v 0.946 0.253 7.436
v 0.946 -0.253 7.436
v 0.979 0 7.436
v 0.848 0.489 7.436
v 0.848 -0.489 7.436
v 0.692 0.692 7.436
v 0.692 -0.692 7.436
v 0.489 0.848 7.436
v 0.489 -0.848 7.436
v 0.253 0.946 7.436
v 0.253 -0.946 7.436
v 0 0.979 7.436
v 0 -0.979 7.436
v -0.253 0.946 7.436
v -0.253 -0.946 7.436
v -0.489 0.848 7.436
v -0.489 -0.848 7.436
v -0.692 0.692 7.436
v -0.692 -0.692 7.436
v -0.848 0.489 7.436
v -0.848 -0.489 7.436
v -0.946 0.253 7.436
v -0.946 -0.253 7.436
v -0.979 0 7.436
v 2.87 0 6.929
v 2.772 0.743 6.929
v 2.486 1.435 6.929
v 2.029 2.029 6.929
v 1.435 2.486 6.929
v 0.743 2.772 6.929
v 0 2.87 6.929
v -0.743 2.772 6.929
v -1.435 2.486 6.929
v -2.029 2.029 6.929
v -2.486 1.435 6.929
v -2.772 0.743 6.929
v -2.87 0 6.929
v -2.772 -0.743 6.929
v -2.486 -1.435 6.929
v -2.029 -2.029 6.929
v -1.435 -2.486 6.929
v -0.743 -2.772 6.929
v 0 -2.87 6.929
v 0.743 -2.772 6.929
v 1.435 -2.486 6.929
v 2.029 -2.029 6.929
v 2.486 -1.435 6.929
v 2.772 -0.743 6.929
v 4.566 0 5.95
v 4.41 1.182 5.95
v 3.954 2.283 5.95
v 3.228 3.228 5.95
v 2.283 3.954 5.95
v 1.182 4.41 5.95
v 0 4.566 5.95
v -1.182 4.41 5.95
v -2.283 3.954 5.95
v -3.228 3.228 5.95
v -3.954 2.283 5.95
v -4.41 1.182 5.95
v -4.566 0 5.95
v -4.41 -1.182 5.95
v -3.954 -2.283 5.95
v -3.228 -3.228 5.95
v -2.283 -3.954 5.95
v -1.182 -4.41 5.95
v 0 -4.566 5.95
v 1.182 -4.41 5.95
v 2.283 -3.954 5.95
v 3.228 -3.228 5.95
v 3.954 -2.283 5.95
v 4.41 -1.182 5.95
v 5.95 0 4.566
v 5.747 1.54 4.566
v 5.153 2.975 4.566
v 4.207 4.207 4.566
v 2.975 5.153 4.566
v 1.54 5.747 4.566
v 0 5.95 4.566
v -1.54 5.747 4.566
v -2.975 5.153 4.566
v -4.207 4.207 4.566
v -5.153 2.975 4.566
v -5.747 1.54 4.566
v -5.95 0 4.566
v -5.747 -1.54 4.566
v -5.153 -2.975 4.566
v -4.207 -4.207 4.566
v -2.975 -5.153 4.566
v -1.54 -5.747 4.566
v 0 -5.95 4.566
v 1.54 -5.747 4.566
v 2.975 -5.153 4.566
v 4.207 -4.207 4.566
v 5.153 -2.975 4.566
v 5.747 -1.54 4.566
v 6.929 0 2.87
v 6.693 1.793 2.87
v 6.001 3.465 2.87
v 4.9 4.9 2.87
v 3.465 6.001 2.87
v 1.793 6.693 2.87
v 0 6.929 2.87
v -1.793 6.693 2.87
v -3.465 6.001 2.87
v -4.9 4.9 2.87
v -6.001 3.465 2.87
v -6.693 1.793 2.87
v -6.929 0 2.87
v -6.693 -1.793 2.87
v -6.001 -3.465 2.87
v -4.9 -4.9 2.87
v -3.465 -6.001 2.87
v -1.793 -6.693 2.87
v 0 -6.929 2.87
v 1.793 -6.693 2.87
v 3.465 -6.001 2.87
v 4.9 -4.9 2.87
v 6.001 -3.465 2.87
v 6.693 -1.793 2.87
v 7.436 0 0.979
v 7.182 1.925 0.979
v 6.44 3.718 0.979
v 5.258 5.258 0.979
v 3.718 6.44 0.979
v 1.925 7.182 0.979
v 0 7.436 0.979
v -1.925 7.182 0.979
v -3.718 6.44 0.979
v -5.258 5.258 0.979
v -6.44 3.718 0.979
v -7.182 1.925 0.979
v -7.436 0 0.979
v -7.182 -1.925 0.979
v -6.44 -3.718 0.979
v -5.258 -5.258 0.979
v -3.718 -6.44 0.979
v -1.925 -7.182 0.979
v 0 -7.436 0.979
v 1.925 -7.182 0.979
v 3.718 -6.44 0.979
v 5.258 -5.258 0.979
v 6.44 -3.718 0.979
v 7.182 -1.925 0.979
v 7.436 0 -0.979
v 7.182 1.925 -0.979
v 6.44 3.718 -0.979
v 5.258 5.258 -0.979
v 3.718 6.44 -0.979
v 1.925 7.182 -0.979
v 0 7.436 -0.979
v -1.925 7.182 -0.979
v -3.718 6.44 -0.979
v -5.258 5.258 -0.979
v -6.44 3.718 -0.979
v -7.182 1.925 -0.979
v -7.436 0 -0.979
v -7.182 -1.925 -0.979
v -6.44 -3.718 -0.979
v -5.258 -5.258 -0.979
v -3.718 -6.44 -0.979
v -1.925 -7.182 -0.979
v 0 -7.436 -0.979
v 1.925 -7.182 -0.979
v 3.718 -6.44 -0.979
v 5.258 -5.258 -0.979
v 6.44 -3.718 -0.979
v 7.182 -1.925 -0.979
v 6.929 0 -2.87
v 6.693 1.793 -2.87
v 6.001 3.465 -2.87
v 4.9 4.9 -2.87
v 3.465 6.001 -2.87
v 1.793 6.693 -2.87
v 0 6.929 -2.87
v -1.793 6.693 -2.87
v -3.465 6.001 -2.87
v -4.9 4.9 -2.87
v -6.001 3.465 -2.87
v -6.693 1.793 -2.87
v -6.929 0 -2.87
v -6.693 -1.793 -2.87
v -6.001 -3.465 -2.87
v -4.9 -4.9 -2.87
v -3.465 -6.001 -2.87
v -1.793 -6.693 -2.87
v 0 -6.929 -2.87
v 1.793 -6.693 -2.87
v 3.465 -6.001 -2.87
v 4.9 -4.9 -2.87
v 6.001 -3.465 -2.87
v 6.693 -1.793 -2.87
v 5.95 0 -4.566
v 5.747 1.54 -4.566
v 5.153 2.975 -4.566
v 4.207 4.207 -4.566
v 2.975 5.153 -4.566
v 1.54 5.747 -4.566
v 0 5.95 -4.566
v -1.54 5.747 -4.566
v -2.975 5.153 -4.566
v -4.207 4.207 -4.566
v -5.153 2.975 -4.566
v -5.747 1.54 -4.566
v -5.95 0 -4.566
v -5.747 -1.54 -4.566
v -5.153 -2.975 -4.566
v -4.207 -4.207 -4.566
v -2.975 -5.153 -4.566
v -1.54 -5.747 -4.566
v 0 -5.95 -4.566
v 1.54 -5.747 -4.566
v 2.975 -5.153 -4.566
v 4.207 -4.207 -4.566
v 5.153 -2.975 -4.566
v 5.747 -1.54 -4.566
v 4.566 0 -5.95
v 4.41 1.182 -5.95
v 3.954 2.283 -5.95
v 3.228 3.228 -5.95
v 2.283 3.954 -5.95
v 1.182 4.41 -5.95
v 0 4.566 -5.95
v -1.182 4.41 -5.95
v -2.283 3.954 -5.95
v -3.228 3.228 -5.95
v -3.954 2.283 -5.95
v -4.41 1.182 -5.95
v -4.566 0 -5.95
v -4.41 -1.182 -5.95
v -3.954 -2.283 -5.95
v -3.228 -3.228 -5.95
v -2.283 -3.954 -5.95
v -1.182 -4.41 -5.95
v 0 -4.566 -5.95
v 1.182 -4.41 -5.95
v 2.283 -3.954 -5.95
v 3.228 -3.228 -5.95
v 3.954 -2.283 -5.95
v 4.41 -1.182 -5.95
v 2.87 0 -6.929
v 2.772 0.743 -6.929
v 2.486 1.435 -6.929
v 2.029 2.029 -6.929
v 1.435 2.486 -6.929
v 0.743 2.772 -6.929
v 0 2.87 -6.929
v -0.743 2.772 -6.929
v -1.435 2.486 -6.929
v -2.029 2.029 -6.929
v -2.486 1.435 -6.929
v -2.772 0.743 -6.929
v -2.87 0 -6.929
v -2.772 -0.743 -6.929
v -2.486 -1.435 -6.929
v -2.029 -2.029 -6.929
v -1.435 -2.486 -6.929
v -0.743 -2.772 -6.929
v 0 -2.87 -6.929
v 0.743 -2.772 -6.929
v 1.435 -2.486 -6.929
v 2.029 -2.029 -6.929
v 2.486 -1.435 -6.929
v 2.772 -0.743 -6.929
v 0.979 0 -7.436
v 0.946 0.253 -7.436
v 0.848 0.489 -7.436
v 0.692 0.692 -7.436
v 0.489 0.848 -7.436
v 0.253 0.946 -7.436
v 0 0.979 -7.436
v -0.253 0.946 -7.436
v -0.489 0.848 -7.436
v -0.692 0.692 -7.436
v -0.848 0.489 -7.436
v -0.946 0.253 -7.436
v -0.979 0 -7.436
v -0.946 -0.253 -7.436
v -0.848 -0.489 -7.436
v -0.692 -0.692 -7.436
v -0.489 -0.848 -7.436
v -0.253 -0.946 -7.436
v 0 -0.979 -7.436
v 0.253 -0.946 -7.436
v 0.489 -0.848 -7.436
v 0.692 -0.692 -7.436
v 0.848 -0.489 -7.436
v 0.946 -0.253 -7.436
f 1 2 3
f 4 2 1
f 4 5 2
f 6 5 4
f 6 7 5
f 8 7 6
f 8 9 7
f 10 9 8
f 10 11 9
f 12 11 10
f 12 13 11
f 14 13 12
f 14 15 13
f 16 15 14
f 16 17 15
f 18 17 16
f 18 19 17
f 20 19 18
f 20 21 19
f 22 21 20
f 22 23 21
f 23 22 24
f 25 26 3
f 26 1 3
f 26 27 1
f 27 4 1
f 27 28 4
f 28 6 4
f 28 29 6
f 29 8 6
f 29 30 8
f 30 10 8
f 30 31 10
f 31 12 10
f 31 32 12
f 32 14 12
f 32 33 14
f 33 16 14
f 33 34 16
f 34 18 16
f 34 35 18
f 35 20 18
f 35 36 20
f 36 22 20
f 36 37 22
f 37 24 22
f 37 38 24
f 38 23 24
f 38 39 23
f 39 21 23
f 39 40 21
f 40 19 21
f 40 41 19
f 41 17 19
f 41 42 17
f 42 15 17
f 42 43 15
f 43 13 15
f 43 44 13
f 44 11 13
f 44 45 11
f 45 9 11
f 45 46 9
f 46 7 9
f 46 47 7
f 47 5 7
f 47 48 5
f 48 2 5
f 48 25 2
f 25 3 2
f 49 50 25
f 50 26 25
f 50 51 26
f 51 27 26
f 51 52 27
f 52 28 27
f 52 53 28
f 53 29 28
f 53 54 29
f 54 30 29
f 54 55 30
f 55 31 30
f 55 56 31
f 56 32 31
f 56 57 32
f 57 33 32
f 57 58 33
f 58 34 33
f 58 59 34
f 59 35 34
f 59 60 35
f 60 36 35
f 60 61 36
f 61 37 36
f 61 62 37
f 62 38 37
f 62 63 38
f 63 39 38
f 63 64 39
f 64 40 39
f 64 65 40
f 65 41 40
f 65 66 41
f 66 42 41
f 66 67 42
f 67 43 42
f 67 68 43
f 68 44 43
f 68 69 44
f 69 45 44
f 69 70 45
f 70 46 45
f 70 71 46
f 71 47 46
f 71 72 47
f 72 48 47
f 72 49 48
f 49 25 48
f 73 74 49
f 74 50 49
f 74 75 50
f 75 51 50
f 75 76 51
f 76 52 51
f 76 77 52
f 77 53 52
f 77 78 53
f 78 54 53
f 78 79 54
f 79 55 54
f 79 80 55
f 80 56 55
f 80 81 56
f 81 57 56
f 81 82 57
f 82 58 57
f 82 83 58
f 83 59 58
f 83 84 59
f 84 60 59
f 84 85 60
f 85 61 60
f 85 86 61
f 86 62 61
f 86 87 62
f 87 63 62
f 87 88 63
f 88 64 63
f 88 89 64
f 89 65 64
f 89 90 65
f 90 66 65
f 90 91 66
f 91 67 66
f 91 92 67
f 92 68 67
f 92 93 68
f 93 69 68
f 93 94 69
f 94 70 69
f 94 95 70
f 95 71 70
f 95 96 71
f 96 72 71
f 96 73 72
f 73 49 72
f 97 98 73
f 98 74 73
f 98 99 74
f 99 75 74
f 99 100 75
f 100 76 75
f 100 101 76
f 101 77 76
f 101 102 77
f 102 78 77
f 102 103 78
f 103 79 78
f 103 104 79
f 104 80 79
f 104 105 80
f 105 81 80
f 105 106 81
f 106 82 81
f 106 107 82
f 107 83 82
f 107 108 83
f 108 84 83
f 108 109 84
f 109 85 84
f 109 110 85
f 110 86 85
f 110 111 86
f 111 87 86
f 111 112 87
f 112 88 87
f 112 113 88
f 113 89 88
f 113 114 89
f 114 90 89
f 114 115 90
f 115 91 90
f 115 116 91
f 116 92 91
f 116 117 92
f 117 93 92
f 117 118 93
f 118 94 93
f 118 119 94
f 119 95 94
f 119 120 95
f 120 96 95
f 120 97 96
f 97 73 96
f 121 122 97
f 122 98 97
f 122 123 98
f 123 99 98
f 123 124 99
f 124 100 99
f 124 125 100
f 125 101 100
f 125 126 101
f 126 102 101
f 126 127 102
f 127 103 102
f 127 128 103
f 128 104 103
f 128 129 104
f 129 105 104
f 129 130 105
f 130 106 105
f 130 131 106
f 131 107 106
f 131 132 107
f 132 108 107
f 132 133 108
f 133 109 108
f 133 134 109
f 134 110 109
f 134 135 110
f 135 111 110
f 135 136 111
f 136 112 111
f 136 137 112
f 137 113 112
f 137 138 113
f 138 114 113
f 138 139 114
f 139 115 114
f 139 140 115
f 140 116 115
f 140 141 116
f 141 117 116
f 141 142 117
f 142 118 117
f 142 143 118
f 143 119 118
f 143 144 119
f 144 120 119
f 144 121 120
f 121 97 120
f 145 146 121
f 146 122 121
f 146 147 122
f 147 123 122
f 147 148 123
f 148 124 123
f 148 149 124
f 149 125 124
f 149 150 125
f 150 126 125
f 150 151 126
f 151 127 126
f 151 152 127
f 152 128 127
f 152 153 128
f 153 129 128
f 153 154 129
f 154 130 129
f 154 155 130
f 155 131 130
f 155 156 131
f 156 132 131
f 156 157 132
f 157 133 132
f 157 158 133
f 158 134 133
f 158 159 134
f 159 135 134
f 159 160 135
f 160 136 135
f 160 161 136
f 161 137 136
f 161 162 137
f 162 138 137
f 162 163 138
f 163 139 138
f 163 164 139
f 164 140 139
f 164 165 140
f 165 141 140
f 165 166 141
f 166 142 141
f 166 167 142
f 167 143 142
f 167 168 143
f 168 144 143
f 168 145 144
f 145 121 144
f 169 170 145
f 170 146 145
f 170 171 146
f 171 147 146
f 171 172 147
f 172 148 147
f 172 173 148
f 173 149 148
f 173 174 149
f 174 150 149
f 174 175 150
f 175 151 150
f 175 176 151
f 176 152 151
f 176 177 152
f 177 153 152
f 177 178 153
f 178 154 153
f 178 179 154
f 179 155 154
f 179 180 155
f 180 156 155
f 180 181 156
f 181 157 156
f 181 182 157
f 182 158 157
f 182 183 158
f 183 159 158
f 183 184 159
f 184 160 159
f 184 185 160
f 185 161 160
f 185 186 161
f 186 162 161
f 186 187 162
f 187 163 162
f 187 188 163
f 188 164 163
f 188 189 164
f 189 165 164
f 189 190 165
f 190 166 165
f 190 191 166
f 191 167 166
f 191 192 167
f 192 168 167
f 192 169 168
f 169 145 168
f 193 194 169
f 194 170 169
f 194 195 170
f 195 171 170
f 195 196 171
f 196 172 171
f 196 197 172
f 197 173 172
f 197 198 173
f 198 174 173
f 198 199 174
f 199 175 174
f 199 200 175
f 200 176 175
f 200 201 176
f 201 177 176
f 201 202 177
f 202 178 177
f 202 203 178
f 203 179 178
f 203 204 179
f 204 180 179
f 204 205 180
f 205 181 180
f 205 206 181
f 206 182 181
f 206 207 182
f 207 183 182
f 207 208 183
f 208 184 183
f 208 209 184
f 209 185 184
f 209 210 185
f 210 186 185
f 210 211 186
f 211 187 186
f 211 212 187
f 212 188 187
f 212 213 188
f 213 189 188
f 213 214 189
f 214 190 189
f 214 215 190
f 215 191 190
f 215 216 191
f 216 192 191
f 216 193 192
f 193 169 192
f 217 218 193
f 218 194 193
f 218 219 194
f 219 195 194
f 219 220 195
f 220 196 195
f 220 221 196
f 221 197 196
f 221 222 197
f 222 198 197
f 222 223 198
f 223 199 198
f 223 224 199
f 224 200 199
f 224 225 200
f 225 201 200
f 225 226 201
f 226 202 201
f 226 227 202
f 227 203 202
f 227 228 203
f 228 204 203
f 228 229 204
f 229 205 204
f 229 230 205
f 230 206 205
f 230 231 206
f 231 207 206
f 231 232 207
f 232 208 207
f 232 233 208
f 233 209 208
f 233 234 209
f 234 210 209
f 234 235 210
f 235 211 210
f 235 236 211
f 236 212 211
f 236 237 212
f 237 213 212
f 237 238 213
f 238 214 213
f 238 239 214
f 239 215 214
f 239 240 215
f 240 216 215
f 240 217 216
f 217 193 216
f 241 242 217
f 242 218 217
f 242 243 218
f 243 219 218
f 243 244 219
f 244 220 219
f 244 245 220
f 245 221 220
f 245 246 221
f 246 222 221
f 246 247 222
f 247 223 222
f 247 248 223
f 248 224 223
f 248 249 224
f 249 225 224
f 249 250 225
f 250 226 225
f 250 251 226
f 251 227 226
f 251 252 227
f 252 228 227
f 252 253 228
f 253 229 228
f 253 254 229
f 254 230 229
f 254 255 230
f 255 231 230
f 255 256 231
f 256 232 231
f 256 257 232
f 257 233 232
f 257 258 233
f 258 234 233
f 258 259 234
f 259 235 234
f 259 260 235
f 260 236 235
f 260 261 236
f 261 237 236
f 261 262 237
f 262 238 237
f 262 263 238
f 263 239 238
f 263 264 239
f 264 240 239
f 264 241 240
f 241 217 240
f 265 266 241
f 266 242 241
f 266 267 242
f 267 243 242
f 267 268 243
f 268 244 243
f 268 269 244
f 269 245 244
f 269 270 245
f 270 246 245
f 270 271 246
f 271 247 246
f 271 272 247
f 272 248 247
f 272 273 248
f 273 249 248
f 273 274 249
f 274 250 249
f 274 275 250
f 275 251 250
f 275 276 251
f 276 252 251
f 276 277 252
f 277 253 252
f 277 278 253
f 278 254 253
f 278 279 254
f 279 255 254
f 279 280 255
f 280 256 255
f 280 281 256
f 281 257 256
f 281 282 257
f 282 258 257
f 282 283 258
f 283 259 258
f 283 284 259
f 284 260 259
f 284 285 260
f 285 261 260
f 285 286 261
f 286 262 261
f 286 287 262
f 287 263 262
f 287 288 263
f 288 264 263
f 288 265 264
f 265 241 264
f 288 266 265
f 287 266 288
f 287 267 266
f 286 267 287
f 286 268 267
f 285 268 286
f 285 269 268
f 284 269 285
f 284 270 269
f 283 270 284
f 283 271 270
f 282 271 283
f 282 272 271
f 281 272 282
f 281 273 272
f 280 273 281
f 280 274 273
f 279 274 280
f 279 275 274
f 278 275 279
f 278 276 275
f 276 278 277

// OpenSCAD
// Generated by SolidPython 1.0.1 on 2020-07-29 00:02:42


sphere(d = 15, r = 3);
/***********************************************
*********      SolidPython code:      **********
************************************************
 
# import packages: SolidPython
from solid import *
from solid.utils import *
from itertools import chain, combinations


class Resize:

    def __init__(self, scad_file):
        self.scad_file = scad_file
        #self.scad_file = import_scad(scad_file)
        # cone/cylinder param:
        self.r1 = 0
        self.r2 = 0
        self.h = 0
        # rectangular prism param:
        self.w = 0
        self.l = 0
        # ellipse param:
        self.r = 0

    # import OpenScad code (file name corresponds to shape)


    # classify shape + parameters
    def assign(self, param1, param2, param3):
        if self.scad_file == 'cone.scad':
            self.r1 = param1
            self.r2 = param2
            self.h = param3
        elif self.scad_file == 'cylinder.scad':
            self.r1 = param1
            self.r2 = param2
            self.h = param3
        elif self.scad_file == 'rectangularPrism.scad':
            self.h = param1
            self.l = param2
            self.w = param3
        else:
            self.r = param1
            self.h = param2

    # resize parameters
    def iterate(self):
        x = range(3, 20, 2)
        i = 1
        if self.scad_file == 'cone.scad':
            tempList = list(combinations(x, 3))
            #print(tempList)
            for i in x:
                for j in range (3):
                    param1 = tempList[i][0]
                    param2 = tempList[i][1]
                    param3 = tempList[i][2]
                    filepath = 'produced_scad_files/' + 'cone' + str(param1) + '_' + str(param2) + '_' + str(param3) + '.scad'
                    scad_render_to_file(cylinder(h=param1, r1=param2, r2=param3), filepath)

        elif self.scad_file == 'cylinder.scad':
            tempList = list(combinations(x, 3))
            for i in x:
                for j in range(3):
                    param1 = tempList[i][0]
                    param2 = tempList[i][1]
                    param3 = tempList[i][2]
                    filepath = 'produced_scad_files/' + 'cylinder' + str(param1) + '_' + str(param2) + '_' + str(param3) + '.scad'
                    scad_render_to_file(cylinder(h=param1, r1=param2, r2=param3), filepath)

        elif self.scad_file == 'rectangularPrism.scad':
            tempList = list(combinations(x, 3))
            for i in x:
                for j in range(3):
                    param1 = tempList[i][0]
                    param2 = tempList[i][1]
                    param3 = tempList[i][2]
                    filepath = 'produced_scad_files/' + 'rectangularPrism' + str(param1) + '_' + str(param2) + '_' + str(
                        param3) + '.scad'
                    scad_render_to_file(cube(size=(param1, param2, param3)), filepath)

        else:
            tempList = list(combinations(x, 2))
            for i in x:
                for j in range(3):
                    param1 = tempList[i][0]
                    param2 = tempList[i][1]
                    filepath = 'produced_scad_files/' + 'ellipse' + str(param1) + '_' + str(param2) + '_' + '.scad'
                    scad_render_to_file(sphere(param1, param2), filepath)

    def render_to_scadfile(self):
        scad_render_to_file(scad, 'example.scad') 
 
************************************************/
